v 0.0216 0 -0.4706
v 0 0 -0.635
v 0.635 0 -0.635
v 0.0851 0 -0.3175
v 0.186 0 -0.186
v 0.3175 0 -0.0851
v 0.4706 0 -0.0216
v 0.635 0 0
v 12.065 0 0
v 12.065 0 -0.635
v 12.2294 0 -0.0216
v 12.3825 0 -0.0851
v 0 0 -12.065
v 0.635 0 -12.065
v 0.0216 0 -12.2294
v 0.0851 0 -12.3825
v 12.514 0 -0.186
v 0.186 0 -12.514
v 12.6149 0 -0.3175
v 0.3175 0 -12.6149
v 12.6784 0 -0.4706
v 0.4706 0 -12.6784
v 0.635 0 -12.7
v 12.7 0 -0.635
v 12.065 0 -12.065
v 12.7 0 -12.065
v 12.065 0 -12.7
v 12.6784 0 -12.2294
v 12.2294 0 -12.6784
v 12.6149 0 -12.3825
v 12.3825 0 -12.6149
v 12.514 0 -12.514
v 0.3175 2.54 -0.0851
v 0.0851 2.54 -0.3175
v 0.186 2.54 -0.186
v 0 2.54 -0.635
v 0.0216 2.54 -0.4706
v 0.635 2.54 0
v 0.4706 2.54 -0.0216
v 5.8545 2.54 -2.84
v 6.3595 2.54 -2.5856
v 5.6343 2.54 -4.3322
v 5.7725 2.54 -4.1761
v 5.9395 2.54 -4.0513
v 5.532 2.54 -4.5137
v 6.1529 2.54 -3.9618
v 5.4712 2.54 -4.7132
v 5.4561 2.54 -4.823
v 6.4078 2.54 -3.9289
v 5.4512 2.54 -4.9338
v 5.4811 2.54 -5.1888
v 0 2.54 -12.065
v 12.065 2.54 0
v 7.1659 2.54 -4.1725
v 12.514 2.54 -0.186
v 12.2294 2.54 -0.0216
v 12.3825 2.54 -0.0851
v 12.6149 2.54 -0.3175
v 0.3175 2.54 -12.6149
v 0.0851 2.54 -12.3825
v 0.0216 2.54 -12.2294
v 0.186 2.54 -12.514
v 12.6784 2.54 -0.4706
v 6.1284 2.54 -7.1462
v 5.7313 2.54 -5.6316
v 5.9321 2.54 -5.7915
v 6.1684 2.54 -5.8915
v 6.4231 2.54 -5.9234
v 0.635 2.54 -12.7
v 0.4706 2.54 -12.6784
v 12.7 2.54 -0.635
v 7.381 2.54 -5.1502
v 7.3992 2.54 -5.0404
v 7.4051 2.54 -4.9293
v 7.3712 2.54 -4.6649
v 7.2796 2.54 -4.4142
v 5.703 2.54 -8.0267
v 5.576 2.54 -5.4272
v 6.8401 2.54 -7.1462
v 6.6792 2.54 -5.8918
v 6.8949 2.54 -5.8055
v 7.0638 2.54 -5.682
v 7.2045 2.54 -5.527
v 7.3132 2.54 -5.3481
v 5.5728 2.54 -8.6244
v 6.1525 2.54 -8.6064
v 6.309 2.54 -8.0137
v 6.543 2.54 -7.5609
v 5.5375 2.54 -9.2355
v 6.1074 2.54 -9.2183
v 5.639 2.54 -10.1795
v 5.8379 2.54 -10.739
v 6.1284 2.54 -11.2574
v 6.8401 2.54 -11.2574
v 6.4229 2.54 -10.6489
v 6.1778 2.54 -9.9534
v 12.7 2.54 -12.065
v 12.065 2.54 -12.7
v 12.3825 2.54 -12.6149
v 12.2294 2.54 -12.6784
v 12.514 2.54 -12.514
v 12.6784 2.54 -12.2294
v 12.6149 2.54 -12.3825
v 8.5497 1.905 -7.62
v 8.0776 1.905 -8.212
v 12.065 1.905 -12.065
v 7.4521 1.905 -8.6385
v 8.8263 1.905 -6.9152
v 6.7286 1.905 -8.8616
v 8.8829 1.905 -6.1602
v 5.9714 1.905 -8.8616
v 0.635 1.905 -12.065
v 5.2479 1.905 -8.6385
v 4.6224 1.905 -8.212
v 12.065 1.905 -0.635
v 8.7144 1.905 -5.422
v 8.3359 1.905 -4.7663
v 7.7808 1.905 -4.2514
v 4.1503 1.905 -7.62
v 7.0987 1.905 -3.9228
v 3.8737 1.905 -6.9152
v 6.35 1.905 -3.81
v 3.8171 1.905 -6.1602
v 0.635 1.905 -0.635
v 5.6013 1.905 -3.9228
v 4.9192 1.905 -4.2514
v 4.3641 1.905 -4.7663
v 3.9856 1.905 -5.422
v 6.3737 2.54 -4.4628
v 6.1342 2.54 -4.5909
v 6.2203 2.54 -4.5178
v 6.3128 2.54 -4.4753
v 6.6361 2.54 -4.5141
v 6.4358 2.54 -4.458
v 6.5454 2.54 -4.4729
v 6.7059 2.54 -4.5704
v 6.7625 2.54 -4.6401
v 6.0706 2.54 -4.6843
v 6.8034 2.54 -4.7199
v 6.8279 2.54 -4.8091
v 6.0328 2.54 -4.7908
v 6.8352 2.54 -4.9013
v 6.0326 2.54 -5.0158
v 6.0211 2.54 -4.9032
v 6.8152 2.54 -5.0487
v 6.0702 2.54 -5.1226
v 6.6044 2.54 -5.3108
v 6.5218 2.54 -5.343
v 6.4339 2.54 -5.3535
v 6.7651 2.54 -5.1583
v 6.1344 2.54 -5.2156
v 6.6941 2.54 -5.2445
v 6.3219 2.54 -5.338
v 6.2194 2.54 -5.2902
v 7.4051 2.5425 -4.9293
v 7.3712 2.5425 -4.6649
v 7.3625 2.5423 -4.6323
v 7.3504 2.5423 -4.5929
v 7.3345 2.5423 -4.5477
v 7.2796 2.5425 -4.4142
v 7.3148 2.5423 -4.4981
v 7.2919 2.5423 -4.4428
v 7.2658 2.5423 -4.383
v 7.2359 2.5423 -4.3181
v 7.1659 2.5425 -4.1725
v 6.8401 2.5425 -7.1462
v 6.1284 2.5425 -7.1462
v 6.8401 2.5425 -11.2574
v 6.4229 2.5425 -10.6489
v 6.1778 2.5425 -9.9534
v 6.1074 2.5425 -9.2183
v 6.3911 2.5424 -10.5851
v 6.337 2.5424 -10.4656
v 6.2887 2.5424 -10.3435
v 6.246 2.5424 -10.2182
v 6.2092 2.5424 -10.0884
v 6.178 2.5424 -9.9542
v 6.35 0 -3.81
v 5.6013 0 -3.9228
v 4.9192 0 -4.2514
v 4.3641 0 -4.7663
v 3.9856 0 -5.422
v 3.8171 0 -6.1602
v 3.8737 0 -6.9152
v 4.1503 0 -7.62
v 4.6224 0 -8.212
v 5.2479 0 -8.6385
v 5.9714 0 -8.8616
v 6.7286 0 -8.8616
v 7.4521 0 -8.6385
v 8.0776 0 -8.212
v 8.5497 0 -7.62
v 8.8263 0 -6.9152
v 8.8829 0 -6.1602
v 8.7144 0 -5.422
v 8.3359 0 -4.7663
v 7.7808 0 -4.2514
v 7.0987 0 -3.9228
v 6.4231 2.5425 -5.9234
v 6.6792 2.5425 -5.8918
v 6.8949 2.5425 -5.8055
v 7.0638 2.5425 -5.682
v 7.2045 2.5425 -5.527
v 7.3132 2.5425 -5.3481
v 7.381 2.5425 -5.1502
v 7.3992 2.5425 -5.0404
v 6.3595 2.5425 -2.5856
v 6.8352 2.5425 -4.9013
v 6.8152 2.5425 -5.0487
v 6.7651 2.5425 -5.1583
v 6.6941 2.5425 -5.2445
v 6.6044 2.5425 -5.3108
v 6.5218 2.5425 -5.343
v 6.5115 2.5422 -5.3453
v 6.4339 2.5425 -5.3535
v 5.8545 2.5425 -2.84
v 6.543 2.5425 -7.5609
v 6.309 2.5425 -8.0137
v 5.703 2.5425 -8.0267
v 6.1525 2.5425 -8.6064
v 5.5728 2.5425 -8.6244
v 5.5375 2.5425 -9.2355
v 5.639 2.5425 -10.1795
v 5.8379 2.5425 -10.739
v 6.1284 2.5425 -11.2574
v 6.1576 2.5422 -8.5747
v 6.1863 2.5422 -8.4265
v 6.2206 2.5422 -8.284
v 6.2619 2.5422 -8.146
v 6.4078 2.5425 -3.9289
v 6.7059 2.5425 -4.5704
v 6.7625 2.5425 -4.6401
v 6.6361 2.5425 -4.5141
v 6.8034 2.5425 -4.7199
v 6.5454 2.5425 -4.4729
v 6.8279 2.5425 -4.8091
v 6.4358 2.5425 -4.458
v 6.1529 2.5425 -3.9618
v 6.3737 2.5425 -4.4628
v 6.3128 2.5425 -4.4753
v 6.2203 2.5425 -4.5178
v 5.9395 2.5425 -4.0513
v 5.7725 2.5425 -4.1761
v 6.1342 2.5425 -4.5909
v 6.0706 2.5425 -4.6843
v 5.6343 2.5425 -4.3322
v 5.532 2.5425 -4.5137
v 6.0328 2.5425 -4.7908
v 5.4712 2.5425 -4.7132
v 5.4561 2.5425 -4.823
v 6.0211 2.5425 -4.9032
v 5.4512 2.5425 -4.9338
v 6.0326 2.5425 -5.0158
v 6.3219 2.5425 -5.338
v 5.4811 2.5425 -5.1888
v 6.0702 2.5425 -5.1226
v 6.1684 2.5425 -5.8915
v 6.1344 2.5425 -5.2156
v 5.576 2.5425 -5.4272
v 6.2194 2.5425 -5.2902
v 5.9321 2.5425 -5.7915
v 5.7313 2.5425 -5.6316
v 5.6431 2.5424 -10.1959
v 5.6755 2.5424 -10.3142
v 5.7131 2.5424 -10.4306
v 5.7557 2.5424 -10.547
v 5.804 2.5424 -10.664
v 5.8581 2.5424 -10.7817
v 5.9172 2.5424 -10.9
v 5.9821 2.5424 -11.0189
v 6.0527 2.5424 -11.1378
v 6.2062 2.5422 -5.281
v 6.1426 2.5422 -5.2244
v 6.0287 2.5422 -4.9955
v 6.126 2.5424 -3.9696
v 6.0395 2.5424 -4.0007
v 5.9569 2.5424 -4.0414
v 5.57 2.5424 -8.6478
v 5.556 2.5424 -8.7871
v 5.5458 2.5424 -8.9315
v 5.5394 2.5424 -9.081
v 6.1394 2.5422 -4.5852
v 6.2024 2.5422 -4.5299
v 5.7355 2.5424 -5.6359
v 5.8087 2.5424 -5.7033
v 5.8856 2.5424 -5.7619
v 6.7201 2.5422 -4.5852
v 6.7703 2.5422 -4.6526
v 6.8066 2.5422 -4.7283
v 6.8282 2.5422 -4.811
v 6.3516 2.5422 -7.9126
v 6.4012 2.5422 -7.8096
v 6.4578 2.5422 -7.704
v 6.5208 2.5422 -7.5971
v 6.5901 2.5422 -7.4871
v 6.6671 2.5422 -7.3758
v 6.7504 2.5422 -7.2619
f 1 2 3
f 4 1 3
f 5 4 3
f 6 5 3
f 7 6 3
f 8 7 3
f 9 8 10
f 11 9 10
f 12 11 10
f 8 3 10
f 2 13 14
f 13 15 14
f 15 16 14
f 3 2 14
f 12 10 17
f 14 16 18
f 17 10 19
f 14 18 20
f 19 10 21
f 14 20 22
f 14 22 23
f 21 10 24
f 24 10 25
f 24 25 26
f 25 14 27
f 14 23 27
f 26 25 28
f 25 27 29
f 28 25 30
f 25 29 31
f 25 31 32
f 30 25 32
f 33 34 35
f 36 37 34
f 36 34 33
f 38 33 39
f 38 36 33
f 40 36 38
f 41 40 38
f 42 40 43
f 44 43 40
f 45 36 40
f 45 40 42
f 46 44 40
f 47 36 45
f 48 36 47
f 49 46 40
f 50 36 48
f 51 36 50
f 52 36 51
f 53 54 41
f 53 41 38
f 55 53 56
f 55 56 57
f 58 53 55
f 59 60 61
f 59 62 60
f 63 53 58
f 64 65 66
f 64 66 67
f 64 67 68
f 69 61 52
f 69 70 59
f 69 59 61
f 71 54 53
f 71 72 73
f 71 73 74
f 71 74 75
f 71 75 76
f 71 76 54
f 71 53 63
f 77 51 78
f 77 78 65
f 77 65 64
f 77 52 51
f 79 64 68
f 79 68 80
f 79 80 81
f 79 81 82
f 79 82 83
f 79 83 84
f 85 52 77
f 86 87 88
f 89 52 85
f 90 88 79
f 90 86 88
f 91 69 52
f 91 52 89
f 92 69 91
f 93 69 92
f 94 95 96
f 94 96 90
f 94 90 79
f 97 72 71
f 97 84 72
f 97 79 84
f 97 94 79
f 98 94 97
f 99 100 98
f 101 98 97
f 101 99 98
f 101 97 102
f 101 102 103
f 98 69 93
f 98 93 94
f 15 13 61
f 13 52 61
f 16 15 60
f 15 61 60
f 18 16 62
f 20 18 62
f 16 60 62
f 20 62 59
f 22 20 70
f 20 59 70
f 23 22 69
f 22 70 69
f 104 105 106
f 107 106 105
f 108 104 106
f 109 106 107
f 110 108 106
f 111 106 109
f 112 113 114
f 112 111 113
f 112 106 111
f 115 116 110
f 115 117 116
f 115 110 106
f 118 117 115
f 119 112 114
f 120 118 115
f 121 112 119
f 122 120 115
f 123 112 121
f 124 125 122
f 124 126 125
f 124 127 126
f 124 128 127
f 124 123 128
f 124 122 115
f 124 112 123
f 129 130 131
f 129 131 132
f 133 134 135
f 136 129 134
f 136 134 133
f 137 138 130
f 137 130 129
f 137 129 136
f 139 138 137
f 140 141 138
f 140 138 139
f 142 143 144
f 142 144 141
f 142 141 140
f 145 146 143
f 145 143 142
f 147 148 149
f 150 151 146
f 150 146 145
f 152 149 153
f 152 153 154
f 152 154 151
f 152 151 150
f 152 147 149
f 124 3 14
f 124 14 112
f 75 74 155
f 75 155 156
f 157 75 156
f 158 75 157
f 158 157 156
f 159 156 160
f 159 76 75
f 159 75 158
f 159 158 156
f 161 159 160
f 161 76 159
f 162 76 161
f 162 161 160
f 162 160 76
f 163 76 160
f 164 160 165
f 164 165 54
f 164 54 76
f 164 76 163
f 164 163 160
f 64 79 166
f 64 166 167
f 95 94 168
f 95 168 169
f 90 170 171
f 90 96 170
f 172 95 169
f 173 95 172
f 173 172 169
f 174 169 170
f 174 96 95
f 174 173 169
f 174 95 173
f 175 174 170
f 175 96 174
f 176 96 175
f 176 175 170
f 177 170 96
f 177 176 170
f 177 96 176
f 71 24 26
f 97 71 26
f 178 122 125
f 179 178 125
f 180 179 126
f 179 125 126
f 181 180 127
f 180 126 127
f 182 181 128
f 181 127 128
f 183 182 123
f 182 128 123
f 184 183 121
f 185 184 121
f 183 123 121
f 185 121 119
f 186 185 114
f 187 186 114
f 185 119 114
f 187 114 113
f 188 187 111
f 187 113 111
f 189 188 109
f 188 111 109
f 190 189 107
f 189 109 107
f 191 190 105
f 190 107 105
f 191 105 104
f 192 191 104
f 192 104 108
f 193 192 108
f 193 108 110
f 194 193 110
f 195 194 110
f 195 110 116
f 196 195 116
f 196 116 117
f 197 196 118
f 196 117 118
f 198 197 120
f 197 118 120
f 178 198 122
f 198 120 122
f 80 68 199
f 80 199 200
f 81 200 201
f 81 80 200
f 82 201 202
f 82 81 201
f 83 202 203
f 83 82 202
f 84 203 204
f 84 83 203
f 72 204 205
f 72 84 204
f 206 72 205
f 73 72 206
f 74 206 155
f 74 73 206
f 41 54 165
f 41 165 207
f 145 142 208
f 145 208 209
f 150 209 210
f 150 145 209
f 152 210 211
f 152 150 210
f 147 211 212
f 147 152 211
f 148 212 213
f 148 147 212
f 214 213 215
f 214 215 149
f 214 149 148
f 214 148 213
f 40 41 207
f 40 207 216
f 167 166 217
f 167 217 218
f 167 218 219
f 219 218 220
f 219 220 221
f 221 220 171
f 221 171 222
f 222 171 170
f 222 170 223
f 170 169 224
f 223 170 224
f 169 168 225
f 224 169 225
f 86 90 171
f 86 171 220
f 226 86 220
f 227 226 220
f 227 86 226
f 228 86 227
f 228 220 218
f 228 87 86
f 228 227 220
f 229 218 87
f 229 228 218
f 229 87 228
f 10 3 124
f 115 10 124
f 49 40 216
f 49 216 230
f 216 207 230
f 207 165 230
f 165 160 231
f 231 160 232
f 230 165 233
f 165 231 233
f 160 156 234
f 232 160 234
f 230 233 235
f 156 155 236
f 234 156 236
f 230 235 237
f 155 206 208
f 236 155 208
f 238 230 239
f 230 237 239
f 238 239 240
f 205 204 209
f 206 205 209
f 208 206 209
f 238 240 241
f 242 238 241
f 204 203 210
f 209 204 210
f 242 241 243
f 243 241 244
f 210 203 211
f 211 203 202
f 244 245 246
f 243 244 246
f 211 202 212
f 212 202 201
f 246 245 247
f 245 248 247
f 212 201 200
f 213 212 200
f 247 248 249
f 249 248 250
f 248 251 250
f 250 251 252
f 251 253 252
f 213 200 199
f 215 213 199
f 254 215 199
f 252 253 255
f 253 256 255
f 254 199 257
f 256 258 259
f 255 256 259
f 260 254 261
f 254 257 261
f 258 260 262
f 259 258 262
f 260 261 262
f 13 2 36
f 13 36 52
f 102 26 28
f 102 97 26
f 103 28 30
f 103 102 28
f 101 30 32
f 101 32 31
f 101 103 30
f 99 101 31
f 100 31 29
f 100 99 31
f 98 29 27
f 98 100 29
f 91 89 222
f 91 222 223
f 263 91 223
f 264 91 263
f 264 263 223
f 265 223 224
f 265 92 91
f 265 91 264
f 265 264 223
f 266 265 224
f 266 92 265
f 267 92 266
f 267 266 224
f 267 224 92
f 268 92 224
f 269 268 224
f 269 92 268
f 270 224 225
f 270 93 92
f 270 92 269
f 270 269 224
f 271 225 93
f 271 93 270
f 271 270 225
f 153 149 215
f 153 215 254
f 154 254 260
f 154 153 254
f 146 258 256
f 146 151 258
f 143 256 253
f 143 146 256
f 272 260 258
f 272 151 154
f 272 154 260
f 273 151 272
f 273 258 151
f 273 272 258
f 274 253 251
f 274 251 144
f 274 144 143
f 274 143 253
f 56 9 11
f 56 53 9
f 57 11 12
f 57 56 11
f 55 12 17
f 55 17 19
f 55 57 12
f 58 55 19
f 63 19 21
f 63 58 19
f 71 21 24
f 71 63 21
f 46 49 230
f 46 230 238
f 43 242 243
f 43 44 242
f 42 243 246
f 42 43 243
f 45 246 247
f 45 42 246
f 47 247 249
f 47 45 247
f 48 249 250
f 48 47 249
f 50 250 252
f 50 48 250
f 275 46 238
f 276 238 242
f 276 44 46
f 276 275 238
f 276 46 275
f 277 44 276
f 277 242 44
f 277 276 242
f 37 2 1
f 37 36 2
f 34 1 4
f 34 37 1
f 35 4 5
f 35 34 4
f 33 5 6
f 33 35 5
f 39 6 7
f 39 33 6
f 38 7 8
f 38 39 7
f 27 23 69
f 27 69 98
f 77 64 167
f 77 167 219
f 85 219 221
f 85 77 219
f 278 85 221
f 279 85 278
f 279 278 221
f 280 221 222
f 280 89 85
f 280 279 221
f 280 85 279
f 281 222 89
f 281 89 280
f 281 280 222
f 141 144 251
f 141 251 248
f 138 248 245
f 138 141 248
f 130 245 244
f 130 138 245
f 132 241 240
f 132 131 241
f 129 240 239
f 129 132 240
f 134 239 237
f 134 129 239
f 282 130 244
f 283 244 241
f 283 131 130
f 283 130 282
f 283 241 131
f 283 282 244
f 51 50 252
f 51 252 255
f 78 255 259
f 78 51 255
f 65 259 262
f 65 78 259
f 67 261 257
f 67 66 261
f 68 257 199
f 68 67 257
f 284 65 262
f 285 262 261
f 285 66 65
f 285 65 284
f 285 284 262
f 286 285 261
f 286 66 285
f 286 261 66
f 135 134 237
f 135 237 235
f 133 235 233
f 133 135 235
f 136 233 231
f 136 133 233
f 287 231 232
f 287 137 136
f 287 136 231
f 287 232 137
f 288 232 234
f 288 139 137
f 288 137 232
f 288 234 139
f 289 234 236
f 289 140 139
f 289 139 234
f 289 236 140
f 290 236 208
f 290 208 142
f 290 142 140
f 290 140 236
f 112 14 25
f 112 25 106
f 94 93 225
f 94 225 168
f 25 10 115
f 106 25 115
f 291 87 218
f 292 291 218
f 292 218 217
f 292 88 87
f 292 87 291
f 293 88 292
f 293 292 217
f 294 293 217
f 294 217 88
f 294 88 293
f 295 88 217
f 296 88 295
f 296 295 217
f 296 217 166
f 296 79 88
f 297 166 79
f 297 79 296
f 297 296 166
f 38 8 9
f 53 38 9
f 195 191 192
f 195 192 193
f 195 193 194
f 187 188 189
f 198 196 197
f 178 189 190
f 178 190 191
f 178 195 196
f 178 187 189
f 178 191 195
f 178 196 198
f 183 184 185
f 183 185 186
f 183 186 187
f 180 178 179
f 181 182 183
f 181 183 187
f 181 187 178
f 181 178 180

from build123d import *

# Parameters (mm, degrees)
SKETCH1_W           = 12.7
SKETCH1_H           = 12.7
BOSS_EXTRUDE1_DEPTH = 2.54
FILLET1_R           = 0.635
SHELL1_START        = 0.635
SHELL1_OUTLINE_W    = 1.905
SHELL1_OUTLINE_H    = 11.43
SHELL1_DEPTH        = 11.43
SKETCH2_R           = 2.54
BOSS_EXTRUDE2_DEPTH = 1.905
BOSS_EXTRUDE4_DEPTH = 0.00254


# Read off the part's stored shape, not the designer's step: Shell1
with BuildPart() as part:
    # Sketch1 → Boss-Extrude1 (new body)
    with BuildSketch(Plane(origin=(0, 0, 0), x_dir=(1, 0, 0), z_dir=(0, 1, 0))):
        with Locations((6.35, 6.35)):
            Rectangle(SKETCH1_W, SKETCH1_H)
    extrude(amount=BOSS_EXTRUDE1_DEPTH)

    # Fillet1
    fillet1_edges = [part.edges().sort_by_distance(p)[0] for p in [
        (0, 1.27, -12.7),
        (12.7, 1.27, -12.7),
        (12.7, 1.27, 0),
        (0, 1.27, 0),
    ]]
    fillet(fillet1_edges, radius=FILLET1_R)

    # Shell1 outline → Shell1 (cut)
    with BuildSketch(Plane.YZ.offset(SHELL1_START)):
        with Locations((0.9525, -6.35)):
            Rectangle(SHELL1_OUTLINE_W, SHELL1_OUTLINE_H)
    extrude(amount=SHELL1_DEPTH, mode=Mode.SUBTRACT)

    # Sketch2 → Boss-Extrude2 (add)
    with BuildSketch(Plane(origin=(0, 1.905, 0), x_dir=(-1, 0, 0), z_dir=(0, -1, 0))):
        with Locations(Location((-6.35, 6.35, 0), (0, 0, 270))):
            Circle(SKETCH2_R)
    extrude(amount=BOSS_EXTRUDE2_DEPTH)

    # Sketch4 → Boss-Extrude4 (add)
    # profile 1 of 2: a face of its own
    with BuildSketch(Plane(origin=(0, 2.54, 0), x_dir=(1, 0, 0), z_dir=(0, 1, 0))):
        with BuildLine():
            Line((6.359463942, 2.585589744), (5.854465946, 2.839996795))
            Line((5.854465946, 2.839996795), (6.407801282, 3.928858974))
            add(Edge.make_bspline(
                [(6.407801282, 3.928858974), (6.37510896, 3.929692258), (6.310926022, 3.931328196), (6.216421654, 3.944922824), (6.126049401, 3.968129722), (6.038744074, 3.999023949), (5.955713077, 4.040440861), (5.875949592, 4.089869773), (5.800557817, 4.1492579), (5.72918427, 4.21601261), (5.664017941, 4.289798172), (5.607454945, 4.369153296), (5.558153789, 4.452064974), (5.519814505, 4.540404997), (5.489020198, 4.632526927), (5.466520324, 4.728907598), (5.45389399, 4.829969864), (5.452129186, 4.898751737), (5.451230769, 4.933766827)],
                knots=[0, 0, 0, 0, 1.014336294, 1.991387562, 2.955278539, 3.906441712, 4.859855302, 5.829322156, 6.813833455, 7.833278715, 8.858926674, 9.863225732, 10.85404919, 11.846815163, 12.845559416, 13.865450493, 14.913355531, 16, 16, 16, 16], degree=3))
            add(Edge.make_bspline(
                [(5.451230769, 4.933766827), (5.4520641, 4.967731119), (5.45370616, 5.034657053), (5.467343628, 5.132882545), (5.48978737, 5.227193368), (5.520579382, 5.317573499), (5.561571384, 5.40341349), (5.60955148, 5.486057396), (5.66820497, 5.563795404), (5.734463459, 5.636964041), (5.80697986, 5.703900425), (5.883913674, 5.762753864), (5.964915094, 5.811949684), (6.048943173, 5.853265097), (6.137516777, 5.884133404), (6.229355921, 5.907423313), (6.325144744, 5.920864918), (6.3901642, 5.922555021), (6.423065705, 5.923410256)],
                knots=[0, 0, 0, 0, 1.055538678, 2.079917126, 3.075849687, 4.065898488, 5.041806164, 6.028602842, 7.031727914, 8.062953097, 9.093756959, 10.095582084, 11.068815425, 12.035667573, 13.000833448, 13.979119574, 14.977382875, 16, 16, 16, 16], degree=3))
            add(Edge.make_bspline(
                [(6.423065705, 5.923410256), (6.457468209, 5.922702118), (6.525116079, 5.92130966), (6.624143475, 5.905944432), (6.71888888, 5.882371363), (6.809737259, 5.850354325), (6.895560767, 5.806900578), (6.977077532, 5.754820959), (7.054016404, 5.692963174), (7.125551114, 5.623110154), (7.190611134, 5.547131925), (7.248278747, 5.467601049), (7.296721989, 5.384673031), (7.336399968, 5.299087975), (7.367308914, 5.210711801), (7.388554875, 5.119419152), (7.402659837, 5.025366142), (7.4042647, 4.961591251), (7.405076923, 4.929314704)],
                knots=[0, 0, 0, 0, 1.062826075, 2.08990367, 3.089830715, 4.078784409, 5.060762809, 6.057138927, 7.064407536, 8.107320944, 9.143871033, 10.153461498, 11.140480137, 12.108246174, 13.065926856, 14.029354859, 15.002654194, 16, 16, 16, 16], degree=3))
            add(Edge.make_bspline(
                [(7.405076923, 4.929314704), (7.404633685, 4.904698148), (7.403740905, 4.855114869), (7.39496241, 4.780759368), (7.381643664, 4.706197784), (7.36618444, 4.643509984), (7.349977595, 4.590667976), (7.334206488, 4.545841333), (7.313971695, 4.496075342), (7.291377525, 4.441036433), (7.265210817, 4.38096596), (7.234929053, 4.316151081), (7.202362379, 4.245630527), (7.178357526, 4.197409534), (7.165934295, 4.172453726)],
                knots=[0, 0, 0, 0, 1.105131805, 2.225983929, 3.357782449, 4.505488967, 5.122909461, 5.839607681, 6.638776516, 7.535249922, 8.51168636, 9.581005249, 10.748097757, 12, 12, 12, 12], degree=3))
            Line((7.165934295, 4.172453726), (6.359463942, 2.585589744))
        make_face()
        with BuildLine():
            add(Edge.make_bspline(
                [(6.435786058, 4.458025641), (6.46309194, 4.459633217), (6.516441451, 4.462774058), (6.593074476, 4.487059704), (6.661657137, 4.528619041), (6.722444439, 4.583831174), (6.772677205, 4.651192501), (6.809199713, 4.727877384), (6.831696453, 4.812297764), (6.834013104, 4.871082471), (6.835205128, 4.901329928)],
                knots=[0, 0, 0, 0, 0.984774978, 1.924027336, 2.867853169, 3.859505234, 4.871392407, 5.881338128, 6.909850265, 8, 8, 8, 8], degree=3))
            add(Edge.make_bspline(
                [(6.835205128, 4.901329928), (6.833769465, 4.932206601), (6.830976757, 4.992269104), (6.808264507, 5.078715896), (6.76945384, 5.156858669), (6.716654147, 5.224786259), (6.655011194, 5.281632973), (6.586078813, 5.323157968), (6.511530825, 5.348835693), (6.45994101, 5.351960048), (6.433878005, 5.353538462)],
                knots=[0, 0, 0, 0, 1.104110315, 2.147758178, 3.172670271, 4.206310416, 5.210906102, 6.157051016, 7.068948237, 8, 8, 8, 8], degree=3))
            add(Edge.make_bspline(
                [(6.433878005, 5.353538462), (6.406330871, 5.351999712), (6.3522423, 5.348978389), (6.274657461, 5.323362327), (6.203136419, 5.282634751), (6.140678718, 5.225595158), (6.086623972, 5.158562153), (6.048930123, 5.080155613), (6.025083687, 4.99431208), (6.022453466, 4.934141867), (6.021102564, 4.903237981)],
                knots=[0, 0, 0, 0, 0.970967322, 1.90648639, 2.855811969, 3.858352357, 4.877096915, 5.878517833, 6.91039038, 8, 8, 8, 8], degree=3))
            add(Edge.make_bspline(
                [(6.021102564, 4.903237981), (6.022513665, 4.872774607), (6.025258108, 4.813526525), (6.048259331, 4.728627364), (6.085726018, 4.651536658), (6.136945653, 4.583644091), (6.20003563, 4.528159923), (6.271669441, 4.487043277), (6.3515753, 4.462708207), (6.407210509, 4.459614594), (6.435786058, 4.458025641)],
                knots=[0, 0, 0, 0, 1.075706617, 2.092137047, 3.084482865, 4.090466434, 5.0784141, 6.035155512, 6.990809768, 8, 8, 8, 8], degree=3))
        make_face(mode=Mode.SUBTRACT)
    # profile 2 of 2: a face of its own
    with BuildSketch(Plane(origin=(0, 2.54, 0), x_dir=(1, 0, 0), z_dir=(0, 1, 0))):
        with BuildLine():
            Line((6.128386018, 11.257410256), (6.840089744, 11.257410256))
            add(Edge.make_bspline(
                [(6.840089744, 11.257410256), (6.809822419, 11.222311467), (6.749724305, 11.152620105), (6.666795677, 11.043407385), (6.58880222, 10.932667564), (6.516859259, 10.819319518), (6.450831014, 10.703557736), (6.390172367, 10.585956901), (6.336053768, 10.465927477), (6.287531103, 10.343512884), (6.244695572, 10.21769031), (6.207842411, 10.087755624), (6.176795055, 9.953583531), (6.151264275, 9.815013647), (6.131654114, 9.672170871), (6.117982965, 9.524677216), (6.108469866, 9.373014933), (6.107757668, 9.270294234), (6.107397436, 9.21833774)],
                knots=[0, 0, 0, 0, 1.00236213, 1.990267575, 2.964862165, 3.931797803, 4.893137898, 5.846900052, 6.793123604, 7.740135921, 8.694427184, 9.667077551, 10.660503013, 11.672460941, 12.714089686, 13.778281025, 14.87624668, 16, 16, 16, 16], degree=3))
            add(Edge.make_bspline(
                [(6.107397436, 9.21833774), (6.107995993, 9.162143219), (6.109175923, 9.051367583), (6.118877551, 8.887757803), (6.134923993, 8.729310145), (6.155999738, 8.575722074), (6.184973215, 8.427707126), (6.219082012, 8.284484773), (6.260167582, 8.146690387), (6.292872796, 8.057661908), (6.309015024, 8.013720353)],
                knots=[0, 0, 0, 0, 1.097990858, 2.164457195, 3.201156713, 4.209415668, 5.192484095, 6.147015238, 7.085427113, 8, 8, 8, 8], degree=3))
            add(Edge.make_bspline(
                [(6.309015024, 8.013720353), (6.322859685, 7.979852544), (6.351131554, 7.910691856), (6.401423106, 7.807609383), (6.457716212, 7.702288141), (6.521502326, 7.595201452), (6.590089423, 7.484963434), (6.66788775, 7.373996815), (6.750785957, 7.259995238), (6.809954754, 7.184594376), (6.840089744, 7.146192308)],
                knots=[0, 0, 0, 0, 0.860028042, 1.756243877, 2.695094802, 3.667075869, 4.686284936, 5.746781471, 6.852423585, 8, 8, 8, 8], degree=3))
            Line((6.840089744, 7.146192308), (6.128386018, 7.146192308))
            add(Edge.make_bspline(
                [(6.128386018, 7.146192308), (6.101555843, 7.190097535), (6.048888171, 7.276283561), (5.97672167, 7.406860871), (5.908837677, 7.533983087), (5.84863606, 7.65988857), (5.79329841, 7.782919252), (5.746285673, 7.904803232), (5.702814586, 8.023514572), (5.667008208, 8.142113651), (5.636420071, 8.262084169), (5.609358218, 8.385886124), (5.587541556, 8.514997933), (5.568864716, 8.649218102), (5.555169811, 8.788642241), (5.545088524, 8.933073848), (5.538405493, 9.082591024), (5.537822099, 9.183985488), (5.537525641, 9.235510216)],
                knots=[0, 0, 0, 0, 1.119871376, 2.19830916, 3.246961562, 4.256259542, 5.235550337, 6.182491613, 7.09917337, 7.986748165, 8.877687696, 9.793695483, 10.744317876, 11.727190303, 12.742913882, 13.793068013, 14.878522868, 16, 16, 16, 16], degree=3))
            add(Edge.make_bspline(
                [(5.537525641, 9.235510216), (5.537767643, 9.285977066), (5.538244775, 9.385478056), (5.545734032, 9.532235898), (5.556506209, 9.67432497), (5.570575435, 9.81170086), (5.590786974, 9.944167937), (5.613890789, 10.072003043), (5.641993832, 10.195063696), (5.674588264, 10.314351115), (5.712537615, 10.431354955), (5.755186155, 10.548123871), (5.803610458, 10.665231326), (5.857886642, 10.78278746), (5.916995095, 10.901297384), (5.981837867, 11.020140735), (6.052595779, 11.139162984), (6.102930607, 11.217694947), (6.128386018, 11.257410256)],
                knots=[0, 0, 0, 0, 1.13127193, 2.230428031, 3.293392423, 4.325815098, 5.325330466, 6.296707414, 7.23754678, 8.15420938, 9.068070667, 9.994306547, 10.940496973, 11.908145907, 12.896524899, 13.908929949, 14.942500703, 16, 16, 16, 16], degree=3))
        make_face()
    extrude(amount=BOSS_EXTRUDE4_DEPTH)


solid = part.part
